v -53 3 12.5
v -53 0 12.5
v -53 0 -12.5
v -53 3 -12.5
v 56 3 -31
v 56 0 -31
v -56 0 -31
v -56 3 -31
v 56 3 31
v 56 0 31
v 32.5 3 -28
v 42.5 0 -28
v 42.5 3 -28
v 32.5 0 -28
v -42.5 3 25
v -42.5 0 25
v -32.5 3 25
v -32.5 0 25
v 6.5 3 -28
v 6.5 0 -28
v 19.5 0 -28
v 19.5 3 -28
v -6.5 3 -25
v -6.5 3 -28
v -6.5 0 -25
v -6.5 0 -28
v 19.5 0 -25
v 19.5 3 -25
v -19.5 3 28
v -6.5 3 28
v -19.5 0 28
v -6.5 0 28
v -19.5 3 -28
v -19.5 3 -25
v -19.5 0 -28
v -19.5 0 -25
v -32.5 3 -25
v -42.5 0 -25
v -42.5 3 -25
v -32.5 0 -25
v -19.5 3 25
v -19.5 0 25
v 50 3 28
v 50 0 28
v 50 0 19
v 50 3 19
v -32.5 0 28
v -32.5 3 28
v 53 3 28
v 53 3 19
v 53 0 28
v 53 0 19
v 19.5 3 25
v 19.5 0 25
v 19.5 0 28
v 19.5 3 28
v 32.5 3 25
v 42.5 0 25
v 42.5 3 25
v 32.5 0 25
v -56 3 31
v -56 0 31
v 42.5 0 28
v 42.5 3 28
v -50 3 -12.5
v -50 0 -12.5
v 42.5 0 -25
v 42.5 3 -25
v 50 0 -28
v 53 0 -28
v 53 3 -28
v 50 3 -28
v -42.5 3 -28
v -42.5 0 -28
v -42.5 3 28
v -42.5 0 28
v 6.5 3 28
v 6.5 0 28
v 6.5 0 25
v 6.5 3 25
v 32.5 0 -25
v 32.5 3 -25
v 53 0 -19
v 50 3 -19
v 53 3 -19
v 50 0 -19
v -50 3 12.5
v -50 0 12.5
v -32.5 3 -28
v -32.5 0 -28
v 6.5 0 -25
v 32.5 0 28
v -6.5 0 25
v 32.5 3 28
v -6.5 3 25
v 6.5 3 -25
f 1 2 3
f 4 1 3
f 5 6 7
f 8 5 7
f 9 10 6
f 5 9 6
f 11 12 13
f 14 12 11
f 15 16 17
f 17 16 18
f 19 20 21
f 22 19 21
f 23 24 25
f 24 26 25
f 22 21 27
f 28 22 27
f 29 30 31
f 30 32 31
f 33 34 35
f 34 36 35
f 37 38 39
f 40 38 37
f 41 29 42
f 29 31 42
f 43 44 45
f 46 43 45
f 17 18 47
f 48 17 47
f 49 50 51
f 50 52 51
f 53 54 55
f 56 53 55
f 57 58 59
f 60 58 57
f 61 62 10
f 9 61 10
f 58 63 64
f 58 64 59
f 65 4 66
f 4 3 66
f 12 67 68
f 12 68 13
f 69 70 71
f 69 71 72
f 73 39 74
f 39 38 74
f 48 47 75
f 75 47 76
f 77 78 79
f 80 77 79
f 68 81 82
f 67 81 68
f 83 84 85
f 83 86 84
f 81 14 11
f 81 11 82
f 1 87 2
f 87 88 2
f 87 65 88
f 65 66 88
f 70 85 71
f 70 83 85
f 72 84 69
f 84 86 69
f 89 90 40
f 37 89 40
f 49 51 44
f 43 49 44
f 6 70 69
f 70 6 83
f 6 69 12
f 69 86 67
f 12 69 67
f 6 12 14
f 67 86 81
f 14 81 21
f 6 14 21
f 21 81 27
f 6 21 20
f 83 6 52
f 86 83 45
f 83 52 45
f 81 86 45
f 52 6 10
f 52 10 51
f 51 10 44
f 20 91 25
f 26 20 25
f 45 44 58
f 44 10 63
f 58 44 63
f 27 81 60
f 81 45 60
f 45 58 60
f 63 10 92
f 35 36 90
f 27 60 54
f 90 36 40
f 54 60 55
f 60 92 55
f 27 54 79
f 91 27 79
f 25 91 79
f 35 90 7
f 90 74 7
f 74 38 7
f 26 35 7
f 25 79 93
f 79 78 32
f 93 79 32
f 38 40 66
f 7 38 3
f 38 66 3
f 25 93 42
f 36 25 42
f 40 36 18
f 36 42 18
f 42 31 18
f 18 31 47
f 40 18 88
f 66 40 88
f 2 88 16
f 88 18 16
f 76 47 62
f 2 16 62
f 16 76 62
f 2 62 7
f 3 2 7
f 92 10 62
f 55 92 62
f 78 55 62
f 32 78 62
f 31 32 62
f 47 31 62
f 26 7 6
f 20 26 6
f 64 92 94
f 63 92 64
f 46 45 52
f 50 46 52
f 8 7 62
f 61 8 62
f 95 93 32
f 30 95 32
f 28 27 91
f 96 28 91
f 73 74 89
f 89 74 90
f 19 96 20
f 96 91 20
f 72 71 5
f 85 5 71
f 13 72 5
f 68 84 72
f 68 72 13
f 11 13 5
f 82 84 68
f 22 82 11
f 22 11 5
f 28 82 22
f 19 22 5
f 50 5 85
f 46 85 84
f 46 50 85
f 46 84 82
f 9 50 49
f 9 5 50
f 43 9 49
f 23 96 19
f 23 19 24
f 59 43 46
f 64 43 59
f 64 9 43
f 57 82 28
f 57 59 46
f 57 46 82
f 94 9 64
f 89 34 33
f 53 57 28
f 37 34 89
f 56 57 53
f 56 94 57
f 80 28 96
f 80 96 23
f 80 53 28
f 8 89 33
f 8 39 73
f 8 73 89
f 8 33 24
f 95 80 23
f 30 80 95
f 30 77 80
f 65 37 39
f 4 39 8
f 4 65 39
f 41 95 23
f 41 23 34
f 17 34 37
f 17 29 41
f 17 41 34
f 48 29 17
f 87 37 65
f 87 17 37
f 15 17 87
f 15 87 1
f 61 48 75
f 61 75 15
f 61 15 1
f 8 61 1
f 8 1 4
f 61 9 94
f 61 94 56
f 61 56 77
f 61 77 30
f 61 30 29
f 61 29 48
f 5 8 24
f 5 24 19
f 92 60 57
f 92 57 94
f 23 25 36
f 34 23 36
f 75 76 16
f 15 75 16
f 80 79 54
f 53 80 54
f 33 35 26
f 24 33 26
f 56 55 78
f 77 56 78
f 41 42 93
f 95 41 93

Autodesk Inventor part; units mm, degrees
ref_plane "YZ Plane" through (0, 0, 0) normal (1, 0, 0) x (0, 1, 0)
ref_plane "XZ Plane" through (0, 0, 0) normal (0, 1, 0) x (-1, 0, 0)
ref_plane "XY Plane" through (0, 0, 0) normal (0, 0, 1) x (1, 0, 0)
sketch "Boceto1" plane through (0, 0, 0) normal (0, 1, 0) x (-1, 0, 0)
  line L0 (-53, -19) -> (-53, -28)
  line L1 (-50, -19) -> (-50, -28)
  line L2 (32.5, -28) -> (32.5, -25)
  line L3 (42.5, -28) -> (32.5, -28)
  line L4 (42.5, -25) -> (42.5, -28)
  line L5 (50, -12.5) -> (50, 12.5)
  line L6 (53, -12.5) -> (50, -12.5)
  line L7 (53, 12.5) -> (53, -12.5)
  line L8 (50, 12.5) -> (53, 12.5)
  line L9 (-53, 28) -> (-50, 28)
  line L10 (-53, 19) -> (-53, 28)
  line L11 (-50, 19) -> (-53, 19)
  line L12 (-50, 28) -> (-50, 19)
  line L13 (-50, -19) -> (-53, -19)
  line L14 (-53, -28) -> (-50, -28)
  line L15 (-19.5, 28) -> (-6.5, 28)
  line L16 (-19.5, 25) -> (-19.5, 28)
  line L17 (-6.5, 25) -> (-19.5, 25)
  line L18 (-6.5, 28) -> (-6.5, 25)
  line L19 (6.5, 28) -> (19.5, 28)
  line L20 (6.5, 25) -> (6.5, 28)
  line L21 (19.5, 25) -> (6.5, 25)
  line L22 (19.5, 28) -> (19.5, 25)
  line L23 (-6.5, -25) -> (-6.5, -28)
  line L24 (-19.5, -25) -> (-6.5, -25)
  line L25 (-19.5, -28) -> (-19.5, -25)
  line L26 (-6.5, -28) -> (-19.5, -28)
  line L27 (19.5, -25) -> (19.5, -28)
  line L28 (6.5, -25) -> (19.5, -25)
  line L29 (6.5, -28) -> (6.5, -25)
  line L30 (19.5, -28) -> (6.5, -28)
  line L31 (-42.5, 28) -> (-42.5, 25)
  line L32 (-32.5, 28) -> (-42.5, 28)
  line L33 (-32.5, 25) -> (-32.5, 28)
  line L34 (-42.5, 25) -> (-32.5, 25)
  line L35 (42.5, -28) -> (42.5, -25)
  line L36 (32.5, -28) -> (42.5, -28)
  line L37 (32.5, -25) -> (32.5, -28)
  line L38 (42.5, -25) -> (32.5, -25)
  line L39 (42.5, -25) -> (32.5, -25)
  line L40 (42.5, -28) -> (42.5, -25)
  line L41 (32.5, -28) -> (42.5, -28)
  line L42 (32.5, -25) -> (32.5, -28)
  line L43 (42.5, 25) -> (32.5, 25)
  line L44 (42.5, 28) -> (42.5, 25)
  line L45 (32.5, 28) -> (42.5, 28)
  line L46 (32.5, 25) -> (32.5, 28)
  line L47 (-56, 31) -> (-56, -31)
  line L48 (56, 31) -> (-56, 31)
  line L49 (56, -31) -> (56, 31)
  line L50 (-56, -31) -> (56, -31)
  line L51 (-32.5, -28) -> (-32.5, -25)
  line L52 (-42.5, -28) -> (-32.5, -28)
  line L53 (-42.5, -25) -> (-42.5, -28)
  line L54 (-32.5, -25) -> (-42.5, -25)
  point P0 (0, 0)
extrude "Extrusión1" add sketch "Boceto1" along normal blind 3
properties part number "Case_Base1" material "MDF Tablero de fibras de densidad media"
